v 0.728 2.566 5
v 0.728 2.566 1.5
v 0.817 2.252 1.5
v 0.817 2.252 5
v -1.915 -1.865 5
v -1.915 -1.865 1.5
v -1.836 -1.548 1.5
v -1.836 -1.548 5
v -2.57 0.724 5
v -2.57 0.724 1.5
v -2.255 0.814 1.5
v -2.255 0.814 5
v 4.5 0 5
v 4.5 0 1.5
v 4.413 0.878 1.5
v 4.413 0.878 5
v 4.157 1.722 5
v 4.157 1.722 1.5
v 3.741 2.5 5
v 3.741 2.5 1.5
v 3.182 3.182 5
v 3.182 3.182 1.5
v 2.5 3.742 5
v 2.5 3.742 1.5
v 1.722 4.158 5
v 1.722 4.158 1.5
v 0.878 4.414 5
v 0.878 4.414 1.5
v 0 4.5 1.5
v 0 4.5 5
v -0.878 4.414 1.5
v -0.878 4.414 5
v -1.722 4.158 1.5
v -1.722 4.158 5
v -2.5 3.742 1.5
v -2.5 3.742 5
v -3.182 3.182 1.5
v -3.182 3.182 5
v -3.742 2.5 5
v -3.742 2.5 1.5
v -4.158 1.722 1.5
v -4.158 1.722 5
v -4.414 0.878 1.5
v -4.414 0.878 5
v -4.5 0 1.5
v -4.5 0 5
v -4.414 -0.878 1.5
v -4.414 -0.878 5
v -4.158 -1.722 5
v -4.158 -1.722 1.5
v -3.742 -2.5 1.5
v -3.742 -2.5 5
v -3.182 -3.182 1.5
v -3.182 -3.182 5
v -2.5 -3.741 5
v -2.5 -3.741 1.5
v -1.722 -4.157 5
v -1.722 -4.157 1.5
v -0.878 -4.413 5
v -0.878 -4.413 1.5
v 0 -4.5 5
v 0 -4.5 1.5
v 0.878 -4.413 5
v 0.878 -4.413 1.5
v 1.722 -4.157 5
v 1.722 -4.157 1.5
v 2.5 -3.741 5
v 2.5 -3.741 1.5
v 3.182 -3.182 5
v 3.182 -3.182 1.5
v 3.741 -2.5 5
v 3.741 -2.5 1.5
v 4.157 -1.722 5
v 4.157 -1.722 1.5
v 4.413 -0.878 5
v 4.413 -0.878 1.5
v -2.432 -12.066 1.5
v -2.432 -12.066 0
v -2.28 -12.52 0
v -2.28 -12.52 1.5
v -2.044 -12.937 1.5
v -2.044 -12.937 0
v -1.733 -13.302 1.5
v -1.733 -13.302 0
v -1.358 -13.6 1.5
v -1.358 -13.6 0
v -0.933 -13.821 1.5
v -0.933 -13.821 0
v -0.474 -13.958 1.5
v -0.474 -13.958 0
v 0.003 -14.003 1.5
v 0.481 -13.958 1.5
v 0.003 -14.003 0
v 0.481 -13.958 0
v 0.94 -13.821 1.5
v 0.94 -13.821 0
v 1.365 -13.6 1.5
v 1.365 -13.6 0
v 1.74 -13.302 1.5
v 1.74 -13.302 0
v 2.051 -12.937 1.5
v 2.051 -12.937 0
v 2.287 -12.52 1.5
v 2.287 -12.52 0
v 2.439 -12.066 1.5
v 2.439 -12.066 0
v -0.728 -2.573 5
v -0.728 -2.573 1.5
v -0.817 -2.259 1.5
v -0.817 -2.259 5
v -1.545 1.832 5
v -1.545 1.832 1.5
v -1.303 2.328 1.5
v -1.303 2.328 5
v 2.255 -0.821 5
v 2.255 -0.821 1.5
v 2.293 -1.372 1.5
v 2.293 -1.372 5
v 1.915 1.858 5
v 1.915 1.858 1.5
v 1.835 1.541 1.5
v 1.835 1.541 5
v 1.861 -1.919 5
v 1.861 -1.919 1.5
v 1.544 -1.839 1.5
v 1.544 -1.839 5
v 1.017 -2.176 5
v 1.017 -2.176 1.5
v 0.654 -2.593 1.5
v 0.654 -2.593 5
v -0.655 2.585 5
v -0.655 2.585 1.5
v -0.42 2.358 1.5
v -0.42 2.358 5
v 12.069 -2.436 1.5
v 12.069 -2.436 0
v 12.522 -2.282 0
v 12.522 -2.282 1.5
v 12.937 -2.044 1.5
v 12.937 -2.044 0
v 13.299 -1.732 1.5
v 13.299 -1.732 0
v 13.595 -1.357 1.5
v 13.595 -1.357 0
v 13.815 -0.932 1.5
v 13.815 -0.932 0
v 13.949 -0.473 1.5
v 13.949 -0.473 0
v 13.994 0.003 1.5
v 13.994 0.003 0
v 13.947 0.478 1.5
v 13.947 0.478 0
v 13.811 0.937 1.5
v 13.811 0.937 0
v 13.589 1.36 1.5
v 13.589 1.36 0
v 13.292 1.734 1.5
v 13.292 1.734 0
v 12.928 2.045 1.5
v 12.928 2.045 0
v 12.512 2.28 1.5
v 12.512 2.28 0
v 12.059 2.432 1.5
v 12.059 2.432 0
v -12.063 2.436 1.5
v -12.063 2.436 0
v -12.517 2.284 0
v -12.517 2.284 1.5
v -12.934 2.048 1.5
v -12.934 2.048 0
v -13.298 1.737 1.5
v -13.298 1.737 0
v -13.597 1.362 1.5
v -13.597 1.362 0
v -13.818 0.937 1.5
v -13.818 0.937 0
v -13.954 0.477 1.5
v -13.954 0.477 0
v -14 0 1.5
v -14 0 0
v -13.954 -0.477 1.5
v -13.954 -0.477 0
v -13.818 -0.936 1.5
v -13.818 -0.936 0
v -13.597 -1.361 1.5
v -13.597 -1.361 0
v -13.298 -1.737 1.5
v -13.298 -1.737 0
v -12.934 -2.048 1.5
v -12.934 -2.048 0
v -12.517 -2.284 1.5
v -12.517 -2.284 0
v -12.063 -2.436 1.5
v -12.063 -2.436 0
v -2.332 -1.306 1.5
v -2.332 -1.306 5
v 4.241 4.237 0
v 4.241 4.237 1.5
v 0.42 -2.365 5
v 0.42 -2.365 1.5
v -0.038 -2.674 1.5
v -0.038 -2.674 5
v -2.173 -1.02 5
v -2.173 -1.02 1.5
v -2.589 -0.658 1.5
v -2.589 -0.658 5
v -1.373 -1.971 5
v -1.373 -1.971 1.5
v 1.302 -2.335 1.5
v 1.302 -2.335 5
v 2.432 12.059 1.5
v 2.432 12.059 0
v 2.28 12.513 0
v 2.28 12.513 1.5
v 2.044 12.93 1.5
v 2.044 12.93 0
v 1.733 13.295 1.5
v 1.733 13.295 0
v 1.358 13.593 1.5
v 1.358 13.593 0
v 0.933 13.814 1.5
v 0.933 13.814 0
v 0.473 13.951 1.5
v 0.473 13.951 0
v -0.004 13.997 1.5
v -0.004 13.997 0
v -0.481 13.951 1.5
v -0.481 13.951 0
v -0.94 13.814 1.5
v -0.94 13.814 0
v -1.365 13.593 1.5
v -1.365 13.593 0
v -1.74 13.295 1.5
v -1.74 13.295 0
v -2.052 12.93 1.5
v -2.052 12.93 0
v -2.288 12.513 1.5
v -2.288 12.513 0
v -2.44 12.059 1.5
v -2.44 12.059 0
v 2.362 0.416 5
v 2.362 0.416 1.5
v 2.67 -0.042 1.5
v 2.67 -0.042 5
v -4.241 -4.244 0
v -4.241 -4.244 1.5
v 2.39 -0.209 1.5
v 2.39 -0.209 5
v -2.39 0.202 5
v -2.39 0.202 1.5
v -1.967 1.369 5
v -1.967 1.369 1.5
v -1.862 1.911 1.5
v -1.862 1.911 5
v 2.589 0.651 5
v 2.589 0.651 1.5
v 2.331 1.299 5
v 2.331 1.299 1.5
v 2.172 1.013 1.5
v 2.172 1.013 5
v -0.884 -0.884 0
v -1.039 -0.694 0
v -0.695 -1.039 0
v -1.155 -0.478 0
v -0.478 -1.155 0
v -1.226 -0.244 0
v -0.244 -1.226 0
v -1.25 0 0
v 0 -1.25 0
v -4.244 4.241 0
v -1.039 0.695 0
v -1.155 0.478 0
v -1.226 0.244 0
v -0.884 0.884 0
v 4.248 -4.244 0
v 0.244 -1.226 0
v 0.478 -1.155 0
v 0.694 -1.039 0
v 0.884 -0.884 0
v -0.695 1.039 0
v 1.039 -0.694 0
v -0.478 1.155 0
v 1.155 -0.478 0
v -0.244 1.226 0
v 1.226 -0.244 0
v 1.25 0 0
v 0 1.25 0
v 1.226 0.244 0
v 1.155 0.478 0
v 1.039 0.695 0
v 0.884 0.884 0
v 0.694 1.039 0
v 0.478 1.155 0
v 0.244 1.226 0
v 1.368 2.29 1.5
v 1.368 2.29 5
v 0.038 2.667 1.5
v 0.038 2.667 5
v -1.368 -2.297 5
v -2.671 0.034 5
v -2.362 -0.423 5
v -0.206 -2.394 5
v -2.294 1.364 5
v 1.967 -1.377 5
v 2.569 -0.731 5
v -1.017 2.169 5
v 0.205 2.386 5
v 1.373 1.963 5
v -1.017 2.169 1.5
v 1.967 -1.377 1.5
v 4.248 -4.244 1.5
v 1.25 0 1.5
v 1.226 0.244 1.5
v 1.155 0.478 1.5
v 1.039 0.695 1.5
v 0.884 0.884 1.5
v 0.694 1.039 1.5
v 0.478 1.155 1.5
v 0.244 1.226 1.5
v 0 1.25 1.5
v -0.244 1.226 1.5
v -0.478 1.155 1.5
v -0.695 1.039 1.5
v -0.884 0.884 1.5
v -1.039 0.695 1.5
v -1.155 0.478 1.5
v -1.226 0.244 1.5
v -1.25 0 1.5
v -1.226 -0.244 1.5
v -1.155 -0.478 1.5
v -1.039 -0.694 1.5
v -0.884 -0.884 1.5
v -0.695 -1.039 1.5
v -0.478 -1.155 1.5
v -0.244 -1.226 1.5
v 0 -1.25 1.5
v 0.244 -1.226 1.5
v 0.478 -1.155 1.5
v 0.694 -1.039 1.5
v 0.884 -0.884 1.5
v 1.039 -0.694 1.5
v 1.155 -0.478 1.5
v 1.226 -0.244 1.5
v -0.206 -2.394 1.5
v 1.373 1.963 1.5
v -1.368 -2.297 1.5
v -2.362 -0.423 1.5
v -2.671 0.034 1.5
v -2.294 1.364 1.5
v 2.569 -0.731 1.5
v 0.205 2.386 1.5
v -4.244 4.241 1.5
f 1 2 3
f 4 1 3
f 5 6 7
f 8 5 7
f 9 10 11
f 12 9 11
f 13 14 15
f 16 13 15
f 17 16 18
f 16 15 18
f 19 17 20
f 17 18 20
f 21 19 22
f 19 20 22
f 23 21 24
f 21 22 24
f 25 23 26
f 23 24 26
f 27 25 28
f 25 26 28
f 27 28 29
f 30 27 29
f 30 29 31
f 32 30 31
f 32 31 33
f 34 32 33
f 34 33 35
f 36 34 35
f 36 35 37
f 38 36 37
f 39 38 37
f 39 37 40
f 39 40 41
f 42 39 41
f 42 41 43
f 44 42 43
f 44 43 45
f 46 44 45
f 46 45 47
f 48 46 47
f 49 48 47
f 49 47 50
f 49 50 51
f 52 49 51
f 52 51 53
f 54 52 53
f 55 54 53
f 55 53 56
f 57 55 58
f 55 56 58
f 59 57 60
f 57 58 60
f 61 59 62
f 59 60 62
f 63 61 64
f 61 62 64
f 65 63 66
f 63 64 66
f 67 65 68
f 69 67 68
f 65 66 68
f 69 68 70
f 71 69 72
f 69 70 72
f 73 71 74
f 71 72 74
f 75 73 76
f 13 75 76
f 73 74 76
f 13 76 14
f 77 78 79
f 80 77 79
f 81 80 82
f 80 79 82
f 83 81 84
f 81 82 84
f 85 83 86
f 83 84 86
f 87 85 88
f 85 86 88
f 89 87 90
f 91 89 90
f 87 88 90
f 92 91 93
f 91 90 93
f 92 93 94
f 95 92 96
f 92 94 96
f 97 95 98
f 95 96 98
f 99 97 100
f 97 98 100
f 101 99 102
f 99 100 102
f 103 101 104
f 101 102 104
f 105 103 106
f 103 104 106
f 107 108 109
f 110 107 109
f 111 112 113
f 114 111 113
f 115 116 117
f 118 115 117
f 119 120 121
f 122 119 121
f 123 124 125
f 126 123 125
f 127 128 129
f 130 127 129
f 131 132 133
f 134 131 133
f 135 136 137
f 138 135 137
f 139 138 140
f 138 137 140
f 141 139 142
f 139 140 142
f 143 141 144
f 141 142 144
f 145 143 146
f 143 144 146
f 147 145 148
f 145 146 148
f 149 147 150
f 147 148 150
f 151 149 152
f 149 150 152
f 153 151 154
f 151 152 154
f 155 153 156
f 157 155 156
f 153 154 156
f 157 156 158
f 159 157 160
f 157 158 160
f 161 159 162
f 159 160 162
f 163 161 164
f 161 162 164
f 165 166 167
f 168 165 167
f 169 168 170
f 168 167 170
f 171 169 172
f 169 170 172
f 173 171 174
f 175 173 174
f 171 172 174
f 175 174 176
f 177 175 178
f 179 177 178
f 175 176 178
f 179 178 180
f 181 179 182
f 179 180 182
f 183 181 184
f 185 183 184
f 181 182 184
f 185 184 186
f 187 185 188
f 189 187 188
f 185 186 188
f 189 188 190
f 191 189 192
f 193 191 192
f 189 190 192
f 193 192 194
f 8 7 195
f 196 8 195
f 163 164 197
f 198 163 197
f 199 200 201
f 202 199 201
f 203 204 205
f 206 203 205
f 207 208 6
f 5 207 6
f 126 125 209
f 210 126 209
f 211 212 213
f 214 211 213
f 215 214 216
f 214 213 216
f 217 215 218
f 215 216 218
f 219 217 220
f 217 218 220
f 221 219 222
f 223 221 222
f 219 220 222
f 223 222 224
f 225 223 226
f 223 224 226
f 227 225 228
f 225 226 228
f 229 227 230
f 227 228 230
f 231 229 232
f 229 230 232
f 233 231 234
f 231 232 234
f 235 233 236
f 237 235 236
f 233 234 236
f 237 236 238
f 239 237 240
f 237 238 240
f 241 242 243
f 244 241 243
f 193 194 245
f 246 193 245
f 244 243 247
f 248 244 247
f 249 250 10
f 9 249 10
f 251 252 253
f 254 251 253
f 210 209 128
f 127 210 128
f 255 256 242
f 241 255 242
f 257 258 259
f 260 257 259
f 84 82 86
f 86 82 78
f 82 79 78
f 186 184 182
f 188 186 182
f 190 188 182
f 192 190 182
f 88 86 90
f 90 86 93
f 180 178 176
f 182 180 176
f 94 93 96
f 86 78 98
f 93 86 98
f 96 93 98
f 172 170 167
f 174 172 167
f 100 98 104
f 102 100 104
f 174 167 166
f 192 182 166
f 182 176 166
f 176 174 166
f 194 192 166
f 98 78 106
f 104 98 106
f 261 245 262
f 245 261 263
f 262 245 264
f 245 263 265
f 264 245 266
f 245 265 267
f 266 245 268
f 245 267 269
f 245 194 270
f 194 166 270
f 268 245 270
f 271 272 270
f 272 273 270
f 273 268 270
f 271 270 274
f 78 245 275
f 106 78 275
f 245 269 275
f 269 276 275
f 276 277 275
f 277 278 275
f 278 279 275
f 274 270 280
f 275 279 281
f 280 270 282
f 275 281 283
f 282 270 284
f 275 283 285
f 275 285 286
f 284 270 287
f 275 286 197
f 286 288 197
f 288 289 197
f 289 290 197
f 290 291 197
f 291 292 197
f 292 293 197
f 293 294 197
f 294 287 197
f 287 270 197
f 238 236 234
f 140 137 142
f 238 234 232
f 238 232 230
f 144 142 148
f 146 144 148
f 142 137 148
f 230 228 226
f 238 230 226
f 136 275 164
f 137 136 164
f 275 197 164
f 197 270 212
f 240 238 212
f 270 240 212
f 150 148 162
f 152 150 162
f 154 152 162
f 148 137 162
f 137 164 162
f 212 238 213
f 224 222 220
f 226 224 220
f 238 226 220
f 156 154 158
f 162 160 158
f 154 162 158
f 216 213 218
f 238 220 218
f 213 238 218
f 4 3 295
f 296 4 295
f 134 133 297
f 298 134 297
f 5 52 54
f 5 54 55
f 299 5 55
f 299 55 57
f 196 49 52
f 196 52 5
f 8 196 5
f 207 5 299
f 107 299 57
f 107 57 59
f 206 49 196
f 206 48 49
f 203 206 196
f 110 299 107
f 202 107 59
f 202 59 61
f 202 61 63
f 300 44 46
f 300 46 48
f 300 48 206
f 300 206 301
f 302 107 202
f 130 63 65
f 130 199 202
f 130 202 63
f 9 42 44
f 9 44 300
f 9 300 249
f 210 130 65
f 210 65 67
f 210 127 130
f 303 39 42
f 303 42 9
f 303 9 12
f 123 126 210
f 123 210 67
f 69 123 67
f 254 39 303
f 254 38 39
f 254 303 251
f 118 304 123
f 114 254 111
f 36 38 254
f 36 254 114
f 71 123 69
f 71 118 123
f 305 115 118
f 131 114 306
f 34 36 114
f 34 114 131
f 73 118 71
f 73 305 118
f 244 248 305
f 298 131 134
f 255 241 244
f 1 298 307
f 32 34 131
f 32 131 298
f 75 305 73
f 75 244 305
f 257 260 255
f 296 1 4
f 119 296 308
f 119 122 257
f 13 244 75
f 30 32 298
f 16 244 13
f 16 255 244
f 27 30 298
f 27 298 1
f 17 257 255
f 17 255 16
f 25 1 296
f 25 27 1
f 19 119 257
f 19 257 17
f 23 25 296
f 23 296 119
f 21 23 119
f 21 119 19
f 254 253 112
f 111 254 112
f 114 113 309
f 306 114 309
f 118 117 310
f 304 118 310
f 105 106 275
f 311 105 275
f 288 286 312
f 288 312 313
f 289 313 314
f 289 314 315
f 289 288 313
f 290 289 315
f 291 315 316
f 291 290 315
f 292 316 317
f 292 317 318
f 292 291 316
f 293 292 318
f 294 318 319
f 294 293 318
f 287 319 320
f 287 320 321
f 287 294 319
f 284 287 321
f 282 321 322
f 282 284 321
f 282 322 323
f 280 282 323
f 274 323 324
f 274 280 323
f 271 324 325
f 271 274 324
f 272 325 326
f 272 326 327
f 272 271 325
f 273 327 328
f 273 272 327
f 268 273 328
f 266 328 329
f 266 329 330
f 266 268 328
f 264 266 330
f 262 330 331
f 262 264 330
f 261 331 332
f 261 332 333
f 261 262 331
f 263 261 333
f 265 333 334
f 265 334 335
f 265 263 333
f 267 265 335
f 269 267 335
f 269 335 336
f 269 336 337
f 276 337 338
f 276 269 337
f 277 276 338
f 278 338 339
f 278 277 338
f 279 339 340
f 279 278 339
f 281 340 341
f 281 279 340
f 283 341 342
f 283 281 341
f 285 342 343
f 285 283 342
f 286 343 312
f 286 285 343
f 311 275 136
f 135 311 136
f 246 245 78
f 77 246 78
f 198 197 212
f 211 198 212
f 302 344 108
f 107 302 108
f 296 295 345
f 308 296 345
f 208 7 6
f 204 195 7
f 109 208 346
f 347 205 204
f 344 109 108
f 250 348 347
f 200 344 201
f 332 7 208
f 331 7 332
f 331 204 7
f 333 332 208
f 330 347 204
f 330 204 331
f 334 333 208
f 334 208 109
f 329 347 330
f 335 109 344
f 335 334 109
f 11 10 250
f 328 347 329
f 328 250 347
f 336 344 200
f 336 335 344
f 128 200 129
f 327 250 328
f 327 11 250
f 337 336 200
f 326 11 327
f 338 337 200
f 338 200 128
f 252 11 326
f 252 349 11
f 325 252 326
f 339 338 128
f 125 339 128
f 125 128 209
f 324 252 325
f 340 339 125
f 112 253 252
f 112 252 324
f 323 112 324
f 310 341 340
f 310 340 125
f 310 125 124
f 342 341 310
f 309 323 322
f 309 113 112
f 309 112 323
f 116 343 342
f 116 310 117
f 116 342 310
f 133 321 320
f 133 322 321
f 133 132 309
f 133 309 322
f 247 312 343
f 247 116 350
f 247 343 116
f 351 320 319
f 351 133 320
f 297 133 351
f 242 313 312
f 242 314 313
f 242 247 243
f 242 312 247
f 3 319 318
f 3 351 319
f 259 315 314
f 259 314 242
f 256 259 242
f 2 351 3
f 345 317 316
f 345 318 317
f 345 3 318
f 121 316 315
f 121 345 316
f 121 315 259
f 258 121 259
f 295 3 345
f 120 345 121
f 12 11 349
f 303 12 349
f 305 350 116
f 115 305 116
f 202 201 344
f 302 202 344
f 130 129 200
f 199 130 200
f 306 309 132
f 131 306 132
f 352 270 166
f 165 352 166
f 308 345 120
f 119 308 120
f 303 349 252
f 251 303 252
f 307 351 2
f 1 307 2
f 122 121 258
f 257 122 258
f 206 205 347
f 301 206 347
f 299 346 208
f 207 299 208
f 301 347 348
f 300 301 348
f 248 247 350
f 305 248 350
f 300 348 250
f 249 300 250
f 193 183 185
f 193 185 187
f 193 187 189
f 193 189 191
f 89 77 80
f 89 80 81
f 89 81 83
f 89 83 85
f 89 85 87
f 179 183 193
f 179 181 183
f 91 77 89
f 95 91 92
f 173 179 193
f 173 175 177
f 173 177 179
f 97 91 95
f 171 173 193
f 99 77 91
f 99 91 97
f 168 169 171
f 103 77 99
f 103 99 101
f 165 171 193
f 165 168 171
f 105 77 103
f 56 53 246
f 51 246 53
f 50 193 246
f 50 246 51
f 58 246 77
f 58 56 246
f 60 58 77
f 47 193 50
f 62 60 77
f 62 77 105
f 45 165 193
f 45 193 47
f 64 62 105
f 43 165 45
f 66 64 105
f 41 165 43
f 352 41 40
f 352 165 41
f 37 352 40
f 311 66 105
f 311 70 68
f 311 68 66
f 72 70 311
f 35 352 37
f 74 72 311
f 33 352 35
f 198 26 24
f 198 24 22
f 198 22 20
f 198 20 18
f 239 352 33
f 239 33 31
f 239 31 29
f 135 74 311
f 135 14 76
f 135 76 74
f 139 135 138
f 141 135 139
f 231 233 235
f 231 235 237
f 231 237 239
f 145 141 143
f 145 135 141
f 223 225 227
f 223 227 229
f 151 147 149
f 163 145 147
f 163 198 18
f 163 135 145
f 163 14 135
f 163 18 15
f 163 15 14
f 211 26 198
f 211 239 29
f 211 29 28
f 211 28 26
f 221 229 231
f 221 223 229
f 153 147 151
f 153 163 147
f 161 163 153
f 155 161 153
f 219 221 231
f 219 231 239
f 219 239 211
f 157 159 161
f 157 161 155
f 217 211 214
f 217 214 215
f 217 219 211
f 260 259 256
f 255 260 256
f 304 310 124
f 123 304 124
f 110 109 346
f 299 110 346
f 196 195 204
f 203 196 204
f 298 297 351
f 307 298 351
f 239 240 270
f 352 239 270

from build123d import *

# Parameters (mm, degrees)
F1_R     = 3.4943107557
F1_R_2   = 3.0428811149
F2_DEPTH = 5
F1_R_3   = 4.5
F3_DEPTH = 5
F0_R     = 4.5
F0_R_2   = 2.5
F0_R_3   = 1.2499972105
F4_DEPTH = 1.5
F5_DEPTH = 5


with BuildPart() as f2:
    # F1 (on Top) → F2 (new body)
    with BuildSketch(Plane.XY):
        with Locations((0.0001326702, 0.0020665845)):
            Circle(F1_R)
        with Locations((-0.0001288142, 0.0001297904)):
            Circle(F1_R_2, mode=Mode.SUBTRACT)
    extrude(amount=F2_DEPTH)

    # F1 (on Top) → F3 (join)
    with BuildSketch(Plane.XY):
        with Locations((-0.0001288142, 0.0001297904)):
            Circle(F1_R_3)
        with Locations((0.0001326702, 0.0020665845)):
            Circle(F1_R, mode=Mode.SUBTRACT)
    extrude(amount=F3_DEPTH)

    # F0 (on Top) + F1 (on Top) → F4 (join)
    with BuildSketch(Plane.XY):
        with BuildLine():
            Line((2.4394025121, -12.0658558892), (4.2479218755, -4.2443155336))
            Line((4.2479218755, -4.2443155336), (12.0694627081, -2.4357959317))
            ThreePointArc((12.0694627081, -2.4357959317), (13.9939445399, 0.0026156227), (12.0586423193, 2.4324482394))
            Line((12.0586423193, 2.4324482394), (4.240708283, 4.2373605681))
            Line((4.240708283, 4.2373605681), (2.4321889196, 12.0589037848))
            ThreePointArc((2.4321889196, 12.0589037848), (-0.0037356104, 13.9965222261), (-2.4396601404, 12.0589037848))
            Line((-2.4396601404, 12.0589037848), (-4.2436064604, 4.240965457))
            Line((-4.2436064604, 4.240965457), (-12.0625067438, 2.4360531283))
            ThreePointArc((-12.0625067438, 2.4360531283), (-14.000128813, 0.0001285983), (-12.0625067438, -2.4357959317))
            Line((-12.0625067438, -2.4357959317), (-4.2409659113, -4.2443155336))
            Line((-4.2409659113, -4.2443155336), (-2.4324465479, -12.0658558892))
            ThreePointArc((-2.4324465479, -12.0658558892), (0.0034779821, -14.0034779629), (2.4394025121, -12.0658558892))
        make_face()
        with Locations((-0.0001288142, 0.0001297904)):
            Circle(F0_R, mode=Mode.SUBTRACT)
        with Locations((-0.0001288142, 0.0001297904)):
            Circle(F0_R)
        with Locations((-0.0001288142, 0.0001297904)):
            Circle(F0_R_2, mode=Mode.SUBTRACT)
        with Locations((-0.0001288142, 0.0001297904)):
            Circle(F0_R_2)
        with Locations((-0.0001288142, 0.0001297904)):
            Circle(F0_R_3, mode=Mode.SUBTRACT)
    with BuildSketch(Plane.XY):
        with Locations((0.0001326702, 0.0020665845)):
            Circle(F1_R)
        with Locations((-0.0001288142, 0.0001297904)):
            Circle(F1_R_2, mode=Mode.SUBTRACT)
    extrude(amount=F4_DEPTH)

    # F1 (on Top) → F5 (join)
    with BuildSketch(Plane.XY):
        with Locations((-0.0001288142, 0.0001297904)):
            Circle(F1_R_2)
        Polygon((2.5888910537, 0.6508482021), (2.3615180848, 0.4162336288), (2.6700632073, -0.0415643753), (2.3897163069, -0.2093383499), (2.5692487953, -0.7313942032), (2.2550279187, -0.8208914163), (2.2933322567, -1.3716230342), (1.9666683684, -1.3767441826), (1.861117768, -1.9186296846), (1.5442495959, -1.8390229053), (1.3020652759, -2.3351228771), (1.0165907184, -2.1762260286), (0.6542527165, -2.5927414983), (0.419636276, -2.3653667199), (-0.0381593369, -2.6739021736), (-0.2059394501, -2.3935590213), (-0.7279900472, -2.5731005304), (-0.8174879323, -2.2588772947), (-1.3682272049, -2.2971816047), (-1.3733483173, -1.9705116288), (-1.9152342451, -1.8649690028), (-1.8356267052, -1.5480978036), (-2.3317276079, -1.3059049719), (-2.1728300866, -1.0204375874), (-2.5893344069, -0.6580942182), (-2.3619698137, -0.4234796389), (-2.6705078515, 0.0343198084), (-2.3901622681, 0.2020929949), (-2.5696944667, 0.7241480054), (-2.2554814608, 0.813645364), (-2.2937858509, 1.36437773), (-1.9671157465, 1.3694988444), (-1.8615737238, 1.9113816752), (-1.5447023894, 1.8317824829), (-1.3025083802, 2.3278777401), (-1.0170415808, 2.1689805445), (-0.6546890428, 2.5854941996), (-0.4200746079, 2.3581213648), (0.037725635, 2.6666599388), (0.205490485, 2.3863142801), (0.7275579628, 2.5658560526), (0.8170392653, 2.2516321833), (1.3677844908, 2.2899363469), (1.3728972309, 1.9632657859), (1.9147806544, 1.8577236477), (1.8351731146, 1.5408524485), (2.3312740172, 1.2986596169), (2.1723769594, 1.0131930648), align=None, mode=Mode.SUBTRACT)
    extrude(amount=F5_DEPTH)


solid = f2.part
